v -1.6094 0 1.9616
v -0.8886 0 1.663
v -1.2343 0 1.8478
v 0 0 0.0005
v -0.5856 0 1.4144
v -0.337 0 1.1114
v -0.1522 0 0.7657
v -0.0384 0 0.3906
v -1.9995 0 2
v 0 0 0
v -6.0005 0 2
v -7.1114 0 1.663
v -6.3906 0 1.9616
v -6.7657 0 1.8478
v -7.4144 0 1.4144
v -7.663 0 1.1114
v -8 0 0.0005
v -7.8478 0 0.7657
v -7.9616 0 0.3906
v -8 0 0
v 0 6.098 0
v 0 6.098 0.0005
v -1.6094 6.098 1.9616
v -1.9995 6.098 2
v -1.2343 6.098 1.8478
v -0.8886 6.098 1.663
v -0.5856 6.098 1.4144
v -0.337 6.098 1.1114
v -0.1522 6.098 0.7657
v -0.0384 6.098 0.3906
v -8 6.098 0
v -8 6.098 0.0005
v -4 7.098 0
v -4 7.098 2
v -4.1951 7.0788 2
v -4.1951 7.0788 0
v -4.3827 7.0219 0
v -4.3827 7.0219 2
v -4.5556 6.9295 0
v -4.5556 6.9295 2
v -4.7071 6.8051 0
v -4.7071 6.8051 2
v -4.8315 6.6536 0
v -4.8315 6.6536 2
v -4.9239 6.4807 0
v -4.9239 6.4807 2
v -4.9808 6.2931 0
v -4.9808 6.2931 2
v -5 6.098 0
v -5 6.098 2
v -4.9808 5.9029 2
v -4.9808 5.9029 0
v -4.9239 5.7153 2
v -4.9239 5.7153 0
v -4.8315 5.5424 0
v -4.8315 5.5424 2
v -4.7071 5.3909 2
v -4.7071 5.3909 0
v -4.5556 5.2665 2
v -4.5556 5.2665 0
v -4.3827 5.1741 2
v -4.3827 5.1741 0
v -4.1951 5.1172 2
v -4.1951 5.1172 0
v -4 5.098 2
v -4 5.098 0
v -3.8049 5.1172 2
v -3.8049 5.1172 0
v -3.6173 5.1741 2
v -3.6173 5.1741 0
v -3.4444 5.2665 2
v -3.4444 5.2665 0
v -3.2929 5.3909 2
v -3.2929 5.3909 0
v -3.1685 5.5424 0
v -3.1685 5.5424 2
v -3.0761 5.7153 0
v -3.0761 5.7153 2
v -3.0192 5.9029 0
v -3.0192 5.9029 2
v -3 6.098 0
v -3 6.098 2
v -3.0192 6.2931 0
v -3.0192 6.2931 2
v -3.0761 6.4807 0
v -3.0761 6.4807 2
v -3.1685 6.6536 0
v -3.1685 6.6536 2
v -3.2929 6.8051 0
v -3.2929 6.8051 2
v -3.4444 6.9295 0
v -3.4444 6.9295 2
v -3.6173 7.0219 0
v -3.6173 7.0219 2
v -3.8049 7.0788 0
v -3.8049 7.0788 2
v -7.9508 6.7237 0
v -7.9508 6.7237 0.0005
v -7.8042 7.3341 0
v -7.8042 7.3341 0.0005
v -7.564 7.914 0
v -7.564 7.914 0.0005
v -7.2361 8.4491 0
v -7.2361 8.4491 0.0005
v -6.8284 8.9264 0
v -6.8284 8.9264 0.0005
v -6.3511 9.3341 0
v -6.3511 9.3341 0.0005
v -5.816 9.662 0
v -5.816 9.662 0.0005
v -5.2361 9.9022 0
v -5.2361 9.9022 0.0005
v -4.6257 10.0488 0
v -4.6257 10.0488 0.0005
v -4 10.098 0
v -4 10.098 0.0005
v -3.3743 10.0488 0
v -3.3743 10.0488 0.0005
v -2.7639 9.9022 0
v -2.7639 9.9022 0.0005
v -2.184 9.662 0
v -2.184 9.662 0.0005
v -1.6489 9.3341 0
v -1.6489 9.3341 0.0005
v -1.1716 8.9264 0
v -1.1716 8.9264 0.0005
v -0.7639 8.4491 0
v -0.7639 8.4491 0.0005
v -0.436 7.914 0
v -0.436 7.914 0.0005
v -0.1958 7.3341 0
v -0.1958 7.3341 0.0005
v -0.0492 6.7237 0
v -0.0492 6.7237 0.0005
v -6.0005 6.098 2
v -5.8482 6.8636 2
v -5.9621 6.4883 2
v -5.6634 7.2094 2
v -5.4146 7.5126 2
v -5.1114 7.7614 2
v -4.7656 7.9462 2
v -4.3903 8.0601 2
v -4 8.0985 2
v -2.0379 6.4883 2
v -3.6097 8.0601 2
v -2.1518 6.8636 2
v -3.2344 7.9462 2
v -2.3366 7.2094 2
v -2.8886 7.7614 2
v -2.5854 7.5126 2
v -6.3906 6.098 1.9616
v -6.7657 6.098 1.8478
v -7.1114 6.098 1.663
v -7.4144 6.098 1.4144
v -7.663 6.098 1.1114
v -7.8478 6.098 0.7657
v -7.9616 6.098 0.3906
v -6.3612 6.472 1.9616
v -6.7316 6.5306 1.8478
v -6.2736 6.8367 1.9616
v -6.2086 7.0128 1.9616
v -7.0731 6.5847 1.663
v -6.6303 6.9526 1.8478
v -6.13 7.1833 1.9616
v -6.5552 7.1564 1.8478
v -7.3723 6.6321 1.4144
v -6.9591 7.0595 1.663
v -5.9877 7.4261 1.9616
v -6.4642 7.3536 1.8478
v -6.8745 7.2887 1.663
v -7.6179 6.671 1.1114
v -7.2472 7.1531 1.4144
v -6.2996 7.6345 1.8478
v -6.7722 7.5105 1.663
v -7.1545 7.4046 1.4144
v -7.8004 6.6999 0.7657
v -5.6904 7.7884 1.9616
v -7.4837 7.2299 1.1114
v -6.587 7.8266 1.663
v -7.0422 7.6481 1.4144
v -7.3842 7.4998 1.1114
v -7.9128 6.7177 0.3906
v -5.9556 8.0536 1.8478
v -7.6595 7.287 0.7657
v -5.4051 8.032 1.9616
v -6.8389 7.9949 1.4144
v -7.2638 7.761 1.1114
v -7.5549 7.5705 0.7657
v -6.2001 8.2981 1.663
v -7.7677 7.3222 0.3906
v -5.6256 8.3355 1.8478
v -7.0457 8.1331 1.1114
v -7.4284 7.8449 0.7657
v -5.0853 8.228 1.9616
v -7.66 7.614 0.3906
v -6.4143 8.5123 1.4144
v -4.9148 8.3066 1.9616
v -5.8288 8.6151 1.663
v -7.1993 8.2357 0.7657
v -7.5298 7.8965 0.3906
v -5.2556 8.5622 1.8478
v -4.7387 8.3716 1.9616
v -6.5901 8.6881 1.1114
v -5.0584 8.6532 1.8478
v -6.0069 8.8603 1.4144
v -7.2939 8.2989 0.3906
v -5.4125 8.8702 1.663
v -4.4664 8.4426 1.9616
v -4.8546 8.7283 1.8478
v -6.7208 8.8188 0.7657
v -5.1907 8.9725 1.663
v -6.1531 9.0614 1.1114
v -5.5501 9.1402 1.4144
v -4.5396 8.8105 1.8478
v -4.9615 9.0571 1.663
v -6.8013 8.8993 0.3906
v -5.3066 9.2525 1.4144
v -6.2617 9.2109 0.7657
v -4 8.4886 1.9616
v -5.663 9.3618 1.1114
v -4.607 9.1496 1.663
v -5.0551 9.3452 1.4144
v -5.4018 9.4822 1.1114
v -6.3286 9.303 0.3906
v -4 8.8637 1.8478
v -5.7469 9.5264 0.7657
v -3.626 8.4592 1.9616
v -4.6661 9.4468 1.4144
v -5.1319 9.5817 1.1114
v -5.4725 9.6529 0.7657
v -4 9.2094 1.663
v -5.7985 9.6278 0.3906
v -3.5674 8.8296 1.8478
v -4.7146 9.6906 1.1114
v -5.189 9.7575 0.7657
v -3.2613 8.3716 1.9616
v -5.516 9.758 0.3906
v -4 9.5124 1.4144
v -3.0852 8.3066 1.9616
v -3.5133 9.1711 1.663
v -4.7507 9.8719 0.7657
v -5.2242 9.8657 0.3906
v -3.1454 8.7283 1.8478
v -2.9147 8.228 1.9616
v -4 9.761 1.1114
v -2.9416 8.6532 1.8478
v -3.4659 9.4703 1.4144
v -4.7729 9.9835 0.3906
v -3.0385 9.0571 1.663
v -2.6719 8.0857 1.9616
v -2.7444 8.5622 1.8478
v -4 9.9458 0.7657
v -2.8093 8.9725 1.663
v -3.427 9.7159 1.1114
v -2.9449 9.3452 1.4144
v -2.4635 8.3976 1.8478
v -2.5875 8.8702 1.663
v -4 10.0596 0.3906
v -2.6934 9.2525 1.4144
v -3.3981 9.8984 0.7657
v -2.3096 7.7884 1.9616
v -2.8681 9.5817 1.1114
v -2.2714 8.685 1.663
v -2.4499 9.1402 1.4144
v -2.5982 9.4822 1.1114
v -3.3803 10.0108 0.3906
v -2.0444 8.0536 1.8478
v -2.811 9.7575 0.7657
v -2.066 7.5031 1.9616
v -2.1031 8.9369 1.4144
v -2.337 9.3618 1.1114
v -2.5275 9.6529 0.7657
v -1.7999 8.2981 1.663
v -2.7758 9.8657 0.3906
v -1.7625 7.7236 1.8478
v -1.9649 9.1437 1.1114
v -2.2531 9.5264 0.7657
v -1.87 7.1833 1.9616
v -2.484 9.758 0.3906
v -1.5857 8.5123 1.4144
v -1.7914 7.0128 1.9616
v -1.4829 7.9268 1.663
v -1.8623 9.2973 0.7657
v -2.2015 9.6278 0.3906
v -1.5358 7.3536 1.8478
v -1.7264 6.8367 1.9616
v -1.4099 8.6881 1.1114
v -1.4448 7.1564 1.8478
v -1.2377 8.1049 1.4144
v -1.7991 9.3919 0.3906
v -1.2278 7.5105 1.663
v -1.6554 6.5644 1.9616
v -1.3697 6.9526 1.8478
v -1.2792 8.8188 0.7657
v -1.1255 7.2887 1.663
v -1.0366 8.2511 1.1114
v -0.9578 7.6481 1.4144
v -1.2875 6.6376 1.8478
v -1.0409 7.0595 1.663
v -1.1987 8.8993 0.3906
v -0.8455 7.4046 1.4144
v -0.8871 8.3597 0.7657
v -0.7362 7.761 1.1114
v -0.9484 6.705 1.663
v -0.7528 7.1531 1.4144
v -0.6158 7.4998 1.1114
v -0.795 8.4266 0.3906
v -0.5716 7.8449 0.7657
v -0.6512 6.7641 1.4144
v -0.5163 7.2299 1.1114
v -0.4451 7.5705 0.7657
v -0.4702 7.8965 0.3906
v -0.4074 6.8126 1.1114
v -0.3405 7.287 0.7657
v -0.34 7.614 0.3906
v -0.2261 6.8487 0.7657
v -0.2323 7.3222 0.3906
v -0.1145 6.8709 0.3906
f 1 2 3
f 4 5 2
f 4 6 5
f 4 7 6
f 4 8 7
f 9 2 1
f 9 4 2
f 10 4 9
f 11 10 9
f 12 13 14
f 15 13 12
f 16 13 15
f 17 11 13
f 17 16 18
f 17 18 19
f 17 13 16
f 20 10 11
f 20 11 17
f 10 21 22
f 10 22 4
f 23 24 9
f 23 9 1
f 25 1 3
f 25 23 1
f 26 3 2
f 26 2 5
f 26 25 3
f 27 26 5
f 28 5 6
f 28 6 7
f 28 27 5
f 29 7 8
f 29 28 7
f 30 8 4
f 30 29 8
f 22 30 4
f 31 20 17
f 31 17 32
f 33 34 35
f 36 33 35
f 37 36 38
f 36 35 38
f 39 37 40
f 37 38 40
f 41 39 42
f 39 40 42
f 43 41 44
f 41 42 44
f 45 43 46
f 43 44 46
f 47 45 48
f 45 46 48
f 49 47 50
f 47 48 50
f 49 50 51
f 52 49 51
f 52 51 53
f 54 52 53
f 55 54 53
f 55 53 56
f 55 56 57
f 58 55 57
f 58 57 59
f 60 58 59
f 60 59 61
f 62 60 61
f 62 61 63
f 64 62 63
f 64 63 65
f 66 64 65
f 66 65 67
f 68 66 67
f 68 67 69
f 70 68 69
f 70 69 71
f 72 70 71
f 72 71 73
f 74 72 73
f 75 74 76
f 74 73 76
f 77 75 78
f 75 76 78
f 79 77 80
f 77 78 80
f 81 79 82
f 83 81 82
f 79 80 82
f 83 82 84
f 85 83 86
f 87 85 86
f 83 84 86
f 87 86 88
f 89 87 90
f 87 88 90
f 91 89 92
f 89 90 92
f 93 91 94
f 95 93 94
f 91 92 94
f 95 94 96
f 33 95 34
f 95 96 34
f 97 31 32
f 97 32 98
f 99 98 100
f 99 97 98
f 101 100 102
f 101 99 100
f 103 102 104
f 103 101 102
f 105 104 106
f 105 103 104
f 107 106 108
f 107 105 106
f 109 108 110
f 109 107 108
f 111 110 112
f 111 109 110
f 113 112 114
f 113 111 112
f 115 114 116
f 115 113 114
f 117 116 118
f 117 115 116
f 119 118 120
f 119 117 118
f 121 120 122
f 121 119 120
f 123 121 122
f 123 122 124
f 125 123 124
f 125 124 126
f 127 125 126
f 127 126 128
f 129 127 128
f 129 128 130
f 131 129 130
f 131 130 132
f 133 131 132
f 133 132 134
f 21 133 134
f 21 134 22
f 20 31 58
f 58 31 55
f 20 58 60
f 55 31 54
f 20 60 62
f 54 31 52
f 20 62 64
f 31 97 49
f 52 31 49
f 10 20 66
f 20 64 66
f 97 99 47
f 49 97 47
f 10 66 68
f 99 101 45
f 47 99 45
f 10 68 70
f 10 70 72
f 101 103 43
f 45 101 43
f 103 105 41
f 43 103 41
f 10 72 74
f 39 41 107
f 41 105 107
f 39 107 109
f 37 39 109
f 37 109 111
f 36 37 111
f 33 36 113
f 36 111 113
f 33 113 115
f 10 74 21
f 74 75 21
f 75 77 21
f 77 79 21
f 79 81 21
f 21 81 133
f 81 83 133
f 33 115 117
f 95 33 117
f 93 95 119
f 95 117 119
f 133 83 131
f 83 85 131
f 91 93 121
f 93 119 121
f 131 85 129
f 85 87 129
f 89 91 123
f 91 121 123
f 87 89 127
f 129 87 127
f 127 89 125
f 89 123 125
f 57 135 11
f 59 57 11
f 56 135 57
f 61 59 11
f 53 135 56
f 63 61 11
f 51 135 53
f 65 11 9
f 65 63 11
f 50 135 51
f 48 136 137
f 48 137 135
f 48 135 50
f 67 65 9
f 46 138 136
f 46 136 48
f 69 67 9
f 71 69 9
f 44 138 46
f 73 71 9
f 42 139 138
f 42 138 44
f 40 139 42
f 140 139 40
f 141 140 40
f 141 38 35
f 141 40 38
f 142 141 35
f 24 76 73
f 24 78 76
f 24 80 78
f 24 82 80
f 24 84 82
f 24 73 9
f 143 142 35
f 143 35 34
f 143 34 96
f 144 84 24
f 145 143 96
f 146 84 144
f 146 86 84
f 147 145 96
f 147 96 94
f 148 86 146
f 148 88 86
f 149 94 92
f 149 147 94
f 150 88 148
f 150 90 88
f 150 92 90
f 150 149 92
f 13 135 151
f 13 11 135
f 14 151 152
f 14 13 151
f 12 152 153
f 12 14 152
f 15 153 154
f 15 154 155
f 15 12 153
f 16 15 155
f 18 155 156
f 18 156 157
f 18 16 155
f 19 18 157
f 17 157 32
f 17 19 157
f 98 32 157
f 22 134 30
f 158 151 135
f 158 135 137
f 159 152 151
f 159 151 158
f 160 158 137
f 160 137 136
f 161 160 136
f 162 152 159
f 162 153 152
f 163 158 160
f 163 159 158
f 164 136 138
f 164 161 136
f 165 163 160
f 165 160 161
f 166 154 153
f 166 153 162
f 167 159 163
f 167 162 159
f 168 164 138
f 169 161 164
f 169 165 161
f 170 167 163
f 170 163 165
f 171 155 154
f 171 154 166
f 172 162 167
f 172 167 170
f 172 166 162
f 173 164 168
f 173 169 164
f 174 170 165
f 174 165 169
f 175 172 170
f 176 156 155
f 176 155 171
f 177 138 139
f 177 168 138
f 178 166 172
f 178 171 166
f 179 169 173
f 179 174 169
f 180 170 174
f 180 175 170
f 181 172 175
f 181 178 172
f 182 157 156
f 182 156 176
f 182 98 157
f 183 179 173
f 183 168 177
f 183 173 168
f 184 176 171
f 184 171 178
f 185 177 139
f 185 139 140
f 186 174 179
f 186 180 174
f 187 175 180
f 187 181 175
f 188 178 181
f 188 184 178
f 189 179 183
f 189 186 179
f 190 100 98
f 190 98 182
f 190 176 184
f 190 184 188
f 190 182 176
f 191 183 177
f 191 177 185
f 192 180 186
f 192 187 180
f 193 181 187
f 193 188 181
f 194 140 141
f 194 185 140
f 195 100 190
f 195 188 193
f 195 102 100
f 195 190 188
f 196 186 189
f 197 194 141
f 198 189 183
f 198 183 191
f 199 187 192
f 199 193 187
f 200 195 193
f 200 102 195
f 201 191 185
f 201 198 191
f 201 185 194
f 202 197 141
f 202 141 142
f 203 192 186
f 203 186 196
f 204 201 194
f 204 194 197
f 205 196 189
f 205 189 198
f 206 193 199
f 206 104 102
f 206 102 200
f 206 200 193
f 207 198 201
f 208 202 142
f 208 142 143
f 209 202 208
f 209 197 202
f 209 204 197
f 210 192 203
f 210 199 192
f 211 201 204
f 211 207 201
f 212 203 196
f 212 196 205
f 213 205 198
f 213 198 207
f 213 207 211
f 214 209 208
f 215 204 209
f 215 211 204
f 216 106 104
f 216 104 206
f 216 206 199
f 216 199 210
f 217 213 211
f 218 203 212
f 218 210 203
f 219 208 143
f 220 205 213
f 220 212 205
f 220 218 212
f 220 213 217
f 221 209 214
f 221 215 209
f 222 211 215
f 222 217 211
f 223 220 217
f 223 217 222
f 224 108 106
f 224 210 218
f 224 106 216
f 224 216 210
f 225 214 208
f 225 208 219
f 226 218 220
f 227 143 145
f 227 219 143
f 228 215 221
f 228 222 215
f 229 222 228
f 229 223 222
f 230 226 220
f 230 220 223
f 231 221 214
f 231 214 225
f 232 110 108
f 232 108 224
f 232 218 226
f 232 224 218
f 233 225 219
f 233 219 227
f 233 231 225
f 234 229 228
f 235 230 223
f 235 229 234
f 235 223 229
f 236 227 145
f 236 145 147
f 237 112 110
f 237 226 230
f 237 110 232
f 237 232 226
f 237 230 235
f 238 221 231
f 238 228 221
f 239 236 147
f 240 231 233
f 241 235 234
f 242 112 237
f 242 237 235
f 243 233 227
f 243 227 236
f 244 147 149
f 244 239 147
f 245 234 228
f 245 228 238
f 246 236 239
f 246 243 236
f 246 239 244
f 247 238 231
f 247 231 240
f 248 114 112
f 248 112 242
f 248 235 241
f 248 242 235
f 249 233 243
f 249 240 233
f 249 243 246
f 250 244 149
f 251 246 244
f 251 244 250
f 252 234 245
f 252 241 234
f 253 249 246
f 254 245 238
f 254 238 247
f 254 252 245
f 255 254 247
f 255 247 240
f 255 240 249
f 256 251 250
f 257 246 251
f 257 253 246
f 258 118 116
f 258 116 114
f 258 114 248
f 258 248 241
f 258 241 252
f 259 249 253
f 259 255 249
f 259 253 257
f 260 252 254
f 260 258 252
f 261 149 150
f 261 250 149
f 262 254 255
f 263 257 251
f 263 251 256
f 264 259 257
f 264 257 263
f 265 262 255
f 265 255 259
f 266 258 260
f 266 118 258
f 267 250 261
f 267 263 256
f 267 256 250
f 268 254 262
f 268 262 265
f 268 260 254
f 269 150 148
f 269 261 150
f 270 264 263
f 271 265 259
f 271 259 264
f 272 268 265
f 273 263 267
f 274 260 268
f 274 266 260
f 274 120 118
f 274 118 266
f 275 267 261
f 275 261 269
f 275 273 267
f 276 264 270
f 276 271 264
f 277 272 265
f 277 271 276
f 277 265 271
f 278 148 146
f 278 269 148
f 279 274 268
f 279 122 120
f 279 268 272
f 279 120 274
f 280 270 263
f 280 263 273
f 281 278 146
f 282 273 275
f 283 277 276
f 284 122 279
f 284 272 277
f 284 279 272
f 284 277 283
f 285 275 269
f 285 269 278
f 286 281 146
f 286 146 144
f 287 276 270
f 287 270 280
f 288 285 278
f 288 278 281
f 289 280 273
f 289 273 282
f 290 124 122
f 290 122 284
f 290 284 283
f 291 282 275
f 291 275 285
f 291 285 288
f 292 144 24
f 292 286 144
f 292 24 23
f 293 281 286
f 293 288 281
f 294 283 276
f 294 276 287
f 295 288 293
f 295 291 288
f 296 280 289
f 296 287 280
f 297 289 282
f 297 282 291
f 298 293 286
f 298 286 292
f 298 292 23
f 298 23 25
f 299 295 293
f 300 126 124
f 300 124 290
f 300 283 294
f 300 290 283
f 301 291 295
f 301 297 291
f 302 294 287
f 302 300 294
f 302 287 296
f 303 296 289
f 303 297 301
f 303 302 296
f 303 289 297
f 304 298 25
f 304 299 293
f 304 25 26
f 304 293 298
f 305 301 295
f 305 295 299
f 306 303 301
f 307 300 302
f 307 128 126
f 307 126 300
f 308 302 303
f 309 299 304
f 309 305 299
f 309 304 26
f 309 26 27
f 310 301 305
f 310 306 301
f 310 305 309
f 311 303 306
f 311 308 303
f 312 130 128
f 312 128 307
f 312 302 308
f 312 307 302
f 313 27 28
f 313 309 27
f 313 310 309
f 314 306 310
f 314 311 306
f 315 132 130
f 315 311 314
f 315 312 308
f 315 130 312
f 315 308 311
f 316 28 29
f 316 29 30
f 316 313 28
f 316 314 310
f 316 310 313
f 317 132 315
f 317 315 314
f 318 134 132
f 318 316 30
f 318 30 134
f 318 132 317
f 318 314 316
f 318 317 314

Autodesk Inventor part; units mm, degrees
ref_plane "YZ Plane" through (0, 0, 0) normal (1, 0, 0) x (0, 1, 0)
ref_plane "XZ Plane" through (0, 0, 0) normal (0, 1, 0) x (-1, 0, 0)
ref_plane "XY Plane" through (0, 0, 0) normal (0, 0, 1) x (1, 0, 0)
sketch "Szkic1" plane through (0, 0, 0) normal (0, 0, 1) x (1, 0, 0)
  line L0 (0, 12.1176) -> (0, -2.0196) construction
  line L1 (-9.6, 0) -> (1.6, 0) construction
  line L2 (0, 0) -> (-8, 0)
  line L3 (-8, 0) -> (-8, 6.098)
  line L4 (-8, 6.098) -> (0, 6.098)
  line L5 (0, 6.098) -> (0, 0)
  circle A0 centre (-4, 6.098) radius 4
  dimension "d0" = 8
  dimension "d1" = 6.098
extrude "Wyciągnięcie proste1" add sketch "Szkic1" along normal blind 2
hole "Otwór1" at (-4, 6.098, 0) direction (0, 0, 1) diameter 2 end through all
fillet "Zaokrąglenie1" radius 2 3 edges at (-4, 10.098, 2) (-8, 3.049, 2) (0, 3.049, 2)
properties part number "podpora_kciuk"
